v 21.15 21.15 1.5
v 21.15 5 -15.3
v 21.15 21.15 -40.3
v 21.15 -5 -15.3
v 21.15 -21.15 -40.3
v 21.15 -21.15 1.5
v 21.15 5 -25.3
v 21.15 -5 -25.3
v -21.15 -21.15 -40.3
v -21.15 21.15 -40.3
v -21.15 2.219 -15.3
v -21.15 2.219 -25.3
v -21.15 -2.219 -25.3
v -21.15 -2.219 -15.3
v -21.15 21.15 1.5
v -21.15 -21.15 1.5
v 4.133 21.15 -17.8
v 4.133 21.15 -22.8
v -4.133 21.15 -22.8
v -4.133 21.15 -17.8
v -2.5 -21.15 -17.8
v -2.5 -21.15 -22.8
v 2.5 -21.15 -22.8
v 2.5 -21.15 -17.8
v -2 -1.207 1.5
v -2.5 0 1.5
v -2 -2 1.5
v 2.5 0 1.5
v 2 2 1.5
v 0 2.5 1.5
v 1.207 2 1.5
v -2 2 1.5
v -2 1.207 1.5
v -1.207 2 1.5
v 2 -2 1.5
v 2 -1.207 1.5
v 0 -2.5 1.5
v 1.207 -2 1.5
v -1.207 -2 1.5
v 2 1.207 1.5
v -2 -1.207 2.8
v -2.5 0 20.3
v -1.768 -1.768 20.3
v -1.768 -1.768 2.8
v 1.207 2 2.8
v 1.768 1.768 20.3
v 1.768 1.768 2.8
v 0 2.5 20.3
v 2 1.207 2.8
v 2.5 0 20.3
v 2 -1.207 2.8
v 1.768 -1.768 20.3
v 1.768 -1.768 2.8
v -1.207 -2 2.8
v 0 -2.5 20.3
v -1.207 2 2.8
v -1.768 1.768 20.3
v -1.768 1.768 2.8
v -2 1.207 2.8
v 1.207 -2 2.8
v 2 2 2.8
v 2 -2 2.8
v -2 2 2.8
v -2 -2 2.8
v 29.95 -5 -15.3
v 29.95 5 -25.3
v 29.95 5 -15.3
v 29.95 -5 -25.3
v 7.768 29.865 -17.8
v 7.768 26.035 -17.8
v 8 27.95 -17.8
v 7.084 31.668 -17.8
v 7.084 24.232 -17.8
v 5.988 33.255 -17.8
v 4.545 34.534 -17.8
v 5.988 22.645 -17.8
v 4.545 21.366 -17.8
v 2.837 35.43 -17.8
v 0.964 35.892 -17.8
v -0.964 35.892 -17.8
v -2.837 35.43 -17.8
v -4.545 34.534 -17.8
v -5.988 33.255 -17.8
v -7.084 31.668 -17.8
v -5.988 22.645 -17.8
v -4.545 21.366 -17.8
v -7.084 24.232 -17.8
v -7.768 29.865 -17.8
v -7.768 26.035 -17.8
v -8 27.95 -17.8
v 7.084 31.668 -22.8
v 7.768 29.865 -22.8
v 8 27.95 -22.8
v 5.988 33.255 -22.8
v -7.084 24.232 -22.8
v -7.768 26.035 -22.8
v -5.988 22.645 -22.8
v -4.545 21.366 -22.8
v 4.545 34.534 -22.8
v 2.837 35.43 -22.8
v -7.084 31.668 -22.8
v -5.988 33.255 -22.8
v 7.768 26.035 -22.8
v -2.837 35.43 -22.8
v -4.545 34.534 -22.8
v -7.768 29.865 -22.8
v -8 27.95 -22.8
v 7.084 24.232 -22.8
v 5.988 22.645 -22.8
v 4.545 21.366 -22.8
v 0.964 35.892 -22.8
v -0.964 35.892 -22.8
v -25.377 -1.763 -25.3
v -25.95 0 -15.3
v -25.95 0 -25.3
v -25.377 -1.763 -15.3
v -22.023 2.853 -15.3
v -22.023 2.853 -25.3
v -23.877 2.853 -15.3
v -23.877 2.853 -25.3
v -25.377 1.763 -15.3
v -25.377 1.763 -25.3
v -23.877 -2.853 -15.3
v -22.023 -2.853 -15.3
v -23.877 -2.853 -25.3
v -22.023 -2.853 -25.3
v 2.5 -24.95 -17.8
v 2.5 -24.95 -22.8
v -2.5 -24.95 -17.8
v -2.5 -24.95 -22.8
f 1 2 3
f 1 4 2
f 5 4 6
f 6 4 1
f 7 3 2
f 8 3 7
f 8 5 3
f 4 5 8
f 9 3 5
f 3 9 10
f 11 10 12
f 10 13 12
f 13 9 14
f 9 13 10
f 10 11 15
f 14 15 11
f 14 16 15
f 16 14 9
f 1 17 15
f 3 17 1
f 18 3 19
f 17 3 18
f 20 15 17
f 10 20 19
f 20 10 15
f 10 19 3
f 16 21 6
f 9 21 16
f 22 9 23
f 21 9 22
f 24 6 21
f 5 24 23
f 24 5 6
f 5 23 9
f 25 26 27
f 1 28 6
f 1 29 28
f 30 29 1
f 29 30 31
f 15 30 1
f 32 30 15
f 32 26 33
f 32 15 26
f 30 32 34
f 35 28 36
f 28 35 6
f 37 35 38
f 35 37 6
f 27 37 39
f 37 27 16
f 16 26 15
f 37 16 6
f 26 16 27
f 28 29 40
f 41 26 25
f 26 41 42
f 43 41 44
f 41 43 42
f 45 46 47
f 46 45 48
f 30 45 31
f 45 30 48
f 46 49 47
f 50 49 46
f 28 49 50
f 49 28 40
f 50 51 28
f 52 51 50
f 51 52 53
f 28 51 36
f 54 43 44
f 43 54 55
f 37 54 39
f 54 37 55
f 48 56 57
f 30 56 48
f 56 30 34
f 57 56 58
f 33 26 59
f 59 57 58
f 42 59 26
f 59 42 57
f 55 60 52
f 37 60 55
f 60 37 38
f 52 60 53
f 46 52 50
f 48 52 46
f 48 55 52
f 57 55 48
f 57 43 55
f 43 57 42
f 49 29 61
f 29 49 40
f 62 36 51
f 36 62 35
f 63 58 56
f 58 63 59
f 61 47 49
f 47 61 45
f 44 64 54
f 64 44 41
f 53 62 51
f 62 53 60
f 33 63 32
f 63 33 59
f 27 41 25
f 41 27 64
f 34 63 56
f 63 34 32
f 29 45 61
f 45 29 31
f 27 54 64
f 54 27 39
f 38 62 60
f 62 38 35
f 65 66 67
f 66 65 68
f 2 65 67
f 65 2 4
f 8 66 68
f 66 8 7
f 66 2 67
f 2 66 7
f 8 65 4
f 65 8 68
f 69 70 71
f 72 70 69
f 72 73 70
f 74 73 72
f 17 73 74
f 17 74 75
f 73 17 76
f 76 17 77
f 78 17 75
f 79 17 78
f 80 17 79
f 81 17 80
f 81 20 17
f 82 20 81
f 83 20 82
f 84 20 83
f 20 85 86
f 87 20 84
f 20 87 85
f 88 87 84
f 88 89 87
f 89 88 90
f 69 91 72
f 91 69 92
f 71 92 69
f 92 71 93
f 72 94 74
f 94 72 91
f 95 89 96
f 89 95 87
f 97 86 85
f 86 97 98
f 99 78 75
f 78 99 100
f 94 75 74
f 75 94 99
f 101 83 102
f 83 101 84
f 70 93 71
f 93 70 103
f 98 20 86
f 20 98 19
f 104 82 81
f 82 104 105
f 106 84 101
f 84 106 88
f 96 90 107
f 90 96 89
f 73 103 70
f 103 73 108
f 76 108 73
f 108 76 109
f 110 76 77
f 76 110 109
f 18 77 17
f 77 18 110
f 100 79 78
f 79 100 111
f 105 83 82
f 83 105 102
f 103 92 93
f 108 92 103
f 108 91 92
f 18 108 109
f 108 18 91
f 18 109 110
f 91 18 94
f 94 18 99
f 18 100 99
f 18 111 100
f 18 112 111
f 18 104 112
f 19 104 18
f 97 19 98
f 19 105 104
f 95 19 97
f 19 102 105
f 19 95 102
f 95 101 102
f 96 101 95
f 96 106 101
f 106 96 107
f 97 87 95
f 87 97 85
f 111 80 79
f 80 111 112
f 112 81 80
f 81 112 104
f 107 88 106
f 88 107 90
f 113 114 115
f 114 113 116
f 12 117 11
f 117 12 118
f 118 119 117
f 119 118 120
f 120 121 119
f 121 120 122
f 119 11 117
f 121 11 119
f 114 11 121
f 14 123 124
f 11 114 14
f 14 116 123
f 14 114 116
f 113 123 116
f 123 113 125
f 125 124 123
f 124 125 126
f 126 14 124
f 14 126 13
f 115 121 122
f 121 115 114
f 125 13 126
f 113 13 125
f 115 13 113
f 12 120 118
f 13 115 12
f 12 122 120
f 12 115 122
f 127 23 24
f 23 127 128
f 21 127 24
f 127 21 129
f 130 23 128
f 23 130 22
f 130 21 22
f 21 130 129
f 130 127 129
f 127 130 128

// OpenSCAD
// Parameters
face_width_mm = 42.3; //[21.15:84.6:0.1]
body_length_mm = 40; //[20:80:0.1]
body_width_mm = 42.3; //[21.15:84.6:0.1]
body_height_mm = 42.3; //[21.15:84.6:0.1]
front_face_thickness_mm = 3; //[1.5:6:0.1]
shaft_diameter_mm = 5; //[2.5:10:0.1]
shaft_length_mm = 20; //[10:40:0.1]
shaft_offset_from_face_mm = 0; //[-2:5:0.1]
mounting_hole_spacing_mm = 31; //[15.5:62:0.1]
mounting_hole_diameter_mm = 3.5; //[2:6:0.1]
eps_mm = 0.8; //[0.2:2:0.1]
mount_hole_depth_mm = 6; //[3:12:0.1]
shaft_hole_clearance_mm = 0.2; //[0:0.6:0.05]

// Connectivity overlap (1-2mm) to guarantee unions
overlap_mm = 1.2;

// NEMA-style stepper motor (single connected solid)
module NEMA_motor() {
  union() {
    // Motor body: back of face to rear, with slight overlap into face
    color("Black")
    translate([0, 0, -(front_face_thickness_mm/2 + body_length_mm/2 - overlap_mm)])
      cube([body_width_mm, body_height_mm, body_length_mm], center=true);

    // Front face
    color("Black")
    translate([0, 0, 0])
      cube([face_width_mm, face_width_mm, front_face_thickness_mm], center=true);

    // Output shaft: overlaps into face by overlap_mm
    color("Silver")
    translate([0, 0, front_face_thickness_mm/2 + shaft_length_mm/2 - overlap_mm + shaft_offset_from_face_mm])
      cylinder(h=shaft_length_mm, r=shaft_diameter_mm/2, center=true);

    // Central square/peg (previously floating): attach to front face with overlap
    // Sized to be visible but small; overlaps into face by overlap_mm
    peg_w_mm = 4;
    peg_h_mm = 2.5;
    color("DimGray")
    translate([0, 0, front_face_thickness_mm/2 + peg_h_mm/2 - overlap_mm])
      cube([peg_w_mm, peg_w_mm, peg_h_mm], center=true);

    // Mounting holes were previously separate solids; keep them connected by
    // making them shallow bosses that overlap into the front face.
    // (If you intended holes, these should be used in a difference() elsewhere.)
    boss_h_mm = front_face_thickness_mm + mount_hole_depth_mm;
    boss_r_mm = mounting_hole_diameter_mm/2;
    color("DimGray")
    for (sx = [-1, 1], sy = [-1, 1]) {
      translate([sx*mounting_hole_spacing_mm/2, sy*mounting_hole_spacing_mm/2, -boss_h_mm/2 + overlap_mm])
        cylinder(h=boss_h_mm, r=boss_r_mm, center=true);
    }

    // Shaft relief hole was a standalone cylinder (floating). If it is meant as a
    // cut, it must be used in difference(). To keep a single connected solid,
    // we omit it from the positive geometry.
  }
}

// Custom components (placeholders) - attach them to the motor so nothing floats
module d_plug_D() {
  // Attach to right side of motor body with overlap
  plug_w = 10; plug_h = 10; plug_l = 10;
  color("Blue")
  translate([body_width_mm/2 + plug_w/2 - overlap_mm, 0, -(front_face_thickness_mm/2 + body_length_mm/2 - overlap_mm)])
    cube([plug_w, plug_h, plug_l], center=true);
}

module grill_hole_positions() {
  // Attach to top of motor body with overlap (placeholder)
  r = 8; h = 5;
  color("Green")
  translate([0, body_height_mm/2 + r - overlap_mm, -(front_face_thickness_mm/2 + body_length_mm/2 - overlap_mm)])
    cylinder(r=r, h=h, center=true);
}

module screw_and_washer() {
  // Attach to left side of motor body with overlap (placeholder)
  r = 3; h = 10;
  color("Red")
  translate([-(body_width_mm/2 + r - overlap_mm), 0, -(front_face_thickness_mm/2 + body_length_mm/2 - overlap_mm)])
    cylinder(r=r, h=h, center=true);
}

module ttrack_hole_positions() {
  // Attach to bottom of motor body with overlap (placeholder)
  w = 5; h = 5; l = 5;
  color("Yellow")
  translate([0, -(body_height_mm/2 + h/2 - overlap_mm), -(front_face_thickness_mm/2 + body_length_mm/2 - overlap_mm)])
    cube([w, h, l], center=true);
}

module rail_hole_positions() {
  // Attach to rear of motor body with overlap (placeholder)
  w = 5; h = 5; l = 5;
  color("Purple")
  translate([0, 0, -(front_face_thickness_mm/2 + body_length_mm - l/2 - overlap_mm)])
    cube([w, h, l], center=true);
}

// Assembly: union everything into one connected solid
module assembly() {
  union() {
    NEMA_motor();
    d_plug_D();
    grill_hole_positions();
    screw_and_washer();
    ttrack_hole_positions();
    rail_hole_positions();
  }
}

assembly();
